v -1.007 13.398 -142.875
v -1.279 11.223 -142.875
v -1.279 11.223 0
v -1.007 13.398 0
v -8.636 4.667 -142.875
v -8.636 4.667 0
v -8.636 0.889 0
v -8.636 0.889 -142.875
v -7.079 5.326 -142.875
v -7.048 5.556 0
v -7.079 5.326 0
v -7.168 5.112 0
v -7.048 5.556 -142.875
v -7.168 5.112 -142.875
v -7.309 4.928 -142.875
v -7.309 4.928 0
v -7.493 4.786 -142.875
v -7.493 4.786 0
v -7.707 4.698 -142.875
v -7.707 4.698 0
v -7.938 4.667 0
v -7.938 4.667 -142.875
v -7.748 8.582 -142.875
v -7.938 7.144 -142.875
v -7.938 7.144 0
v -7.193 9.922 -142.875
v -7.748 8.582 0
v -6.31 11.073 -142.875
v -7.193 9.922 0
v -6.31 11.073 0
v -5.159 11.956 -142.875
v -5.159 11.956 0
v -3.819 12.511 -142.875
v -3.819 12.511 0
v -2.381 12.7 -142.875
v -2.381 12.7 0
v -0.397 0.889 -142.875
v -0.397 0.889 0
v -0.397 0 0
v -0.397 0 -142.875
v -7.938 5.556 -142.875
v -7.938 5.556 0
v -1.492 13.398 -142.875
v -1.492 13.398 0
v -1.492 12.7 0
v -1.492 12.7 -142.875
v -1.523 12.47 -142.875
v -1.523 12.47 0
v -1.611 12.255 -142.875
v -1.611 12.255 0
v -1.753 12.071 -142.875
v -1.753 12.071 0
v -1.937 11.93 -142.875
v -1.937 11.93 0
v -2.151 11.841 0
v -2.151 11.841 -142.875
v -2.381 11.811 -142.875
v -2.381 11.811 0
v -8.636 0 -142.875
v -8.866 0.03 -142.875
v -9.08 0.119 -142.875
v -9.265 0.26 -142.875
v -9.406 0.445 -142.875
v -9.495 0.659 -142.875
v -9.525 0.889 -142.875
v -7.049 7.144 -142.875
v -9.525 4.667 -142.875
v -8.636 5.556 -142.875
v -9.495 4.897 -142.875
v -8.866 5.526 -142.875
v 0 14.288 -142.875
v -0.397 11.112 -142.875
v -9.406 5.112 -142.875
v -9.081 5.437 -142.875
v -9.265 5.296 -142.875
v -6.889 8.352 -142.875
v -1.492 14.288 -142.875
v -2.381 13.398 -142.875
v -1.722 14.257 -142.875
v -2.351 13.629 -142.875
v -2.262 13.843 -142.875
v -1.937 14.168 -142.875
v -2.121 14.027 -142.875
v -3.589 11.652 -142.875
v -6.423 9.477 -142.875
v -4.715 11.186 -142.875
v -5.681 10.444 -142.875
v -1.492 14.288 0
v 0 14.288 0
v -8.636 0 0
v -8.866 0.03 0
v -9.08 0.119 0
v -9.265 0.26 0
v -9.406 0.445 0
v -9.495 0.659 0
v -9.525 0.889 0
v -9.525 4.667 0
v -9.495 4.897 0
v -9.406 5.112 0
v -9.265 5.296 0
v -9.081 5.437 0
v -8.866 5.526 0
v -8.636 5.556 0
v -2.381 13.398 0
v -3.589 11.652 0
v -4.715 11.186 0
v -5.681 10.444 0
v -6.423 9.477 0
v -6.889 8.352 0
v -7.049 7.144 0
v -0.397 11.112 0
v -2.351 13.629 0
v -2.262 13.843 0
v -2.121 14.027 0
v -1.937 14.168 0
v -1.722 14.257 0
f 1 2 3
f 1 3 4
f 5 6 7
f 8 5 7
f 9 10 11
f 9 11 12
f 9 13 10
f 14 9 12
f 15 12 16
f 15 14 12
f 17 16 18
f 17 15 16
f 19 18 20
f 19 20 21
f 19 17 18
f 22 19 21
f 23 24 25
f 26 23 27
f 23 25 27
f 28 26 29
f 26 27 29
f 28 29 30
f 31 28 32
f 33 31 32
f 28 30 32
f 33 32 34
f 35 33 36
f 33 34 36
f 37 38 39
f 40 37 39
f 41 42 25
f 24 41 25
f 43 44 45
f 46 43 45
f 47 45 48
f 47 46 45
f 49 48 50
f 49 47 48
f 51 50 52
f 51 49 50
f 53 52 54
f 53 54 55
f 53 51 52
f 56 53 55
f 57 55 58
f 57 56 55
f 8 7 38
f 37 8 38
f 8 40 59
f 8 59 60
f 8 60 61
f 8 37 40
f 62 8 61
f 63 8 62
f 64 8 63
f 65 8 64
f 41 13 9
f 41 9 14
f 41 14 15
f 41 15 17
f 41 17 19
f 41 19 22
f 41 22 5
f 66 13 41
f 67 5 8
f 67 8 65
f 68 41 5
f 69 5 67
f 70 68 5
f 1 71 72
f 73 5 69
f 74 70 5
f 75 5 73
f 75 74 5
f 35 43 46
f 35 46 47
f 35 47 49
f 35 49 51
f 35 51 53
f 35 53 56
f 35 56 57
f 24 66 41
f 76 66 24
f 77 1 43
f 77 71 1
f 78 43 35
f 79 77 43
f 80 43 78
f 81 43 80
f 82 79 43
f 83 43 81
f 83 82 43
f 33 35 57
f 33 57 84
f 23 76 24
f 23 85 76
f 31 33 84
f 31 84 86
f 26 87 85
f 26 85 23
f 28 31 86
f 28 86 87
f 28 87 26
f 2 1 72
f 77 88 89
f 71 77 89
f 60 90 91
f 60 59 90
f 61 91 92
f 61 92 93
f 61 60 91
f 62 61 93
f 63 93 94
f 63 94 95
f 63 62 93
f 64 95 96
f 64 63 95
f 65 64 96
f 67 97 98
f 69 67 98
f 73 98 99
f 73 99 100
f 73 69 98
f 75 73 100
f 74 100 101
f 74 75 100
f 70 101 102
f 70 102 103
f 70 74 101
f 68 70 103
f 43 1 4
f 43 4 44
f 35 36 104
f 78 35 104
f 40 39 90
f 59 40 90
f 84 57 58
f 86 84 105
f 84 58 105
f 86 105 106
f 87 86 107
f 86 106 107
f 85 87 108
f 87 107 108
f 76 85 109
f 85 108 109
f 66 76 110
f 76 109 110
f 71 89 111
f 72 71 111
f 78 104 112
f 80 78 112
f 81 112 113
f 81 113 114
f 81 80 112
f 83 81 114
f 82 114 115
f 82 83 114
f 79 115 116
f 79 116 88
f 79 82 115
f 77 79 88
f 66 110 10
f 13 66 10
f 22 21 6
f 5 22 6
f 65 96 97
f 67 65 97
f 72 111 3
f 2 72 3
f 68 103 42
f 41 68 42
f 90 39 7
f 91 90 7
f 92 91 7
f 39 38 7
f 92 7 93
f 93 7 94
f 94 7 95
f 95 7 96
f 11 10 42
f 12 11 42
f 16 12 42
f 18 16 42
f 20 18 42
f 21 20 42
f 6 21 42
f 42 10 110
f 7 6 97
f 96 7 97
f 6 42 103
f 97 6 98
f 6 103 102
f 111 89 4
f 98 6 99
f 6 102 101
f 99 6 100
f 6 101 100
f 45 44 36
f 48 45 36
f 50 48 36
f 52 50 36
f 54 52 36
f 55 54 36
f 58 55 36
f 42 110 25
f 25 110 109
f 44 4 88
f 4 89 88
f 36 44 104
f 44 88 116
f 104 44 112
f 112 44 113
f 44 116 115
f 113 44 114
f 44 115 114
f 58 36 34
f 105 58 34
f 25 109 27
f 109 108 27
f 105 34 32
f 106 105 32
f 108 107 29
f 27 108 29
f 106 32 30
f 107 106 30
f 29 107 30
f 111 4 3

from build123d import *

# Parameters (mm, degrees)
EXTRUDE_THIN1_DEPTH = 142.875
FILLET1_R           = 0.889


with BuildPart() as part:
    # Sketch1 → Extrude-Thin1 (new body)
    with BuildSketch(Plane.XY):
        with BuildLine():
            Line((-0.396875, 0), (-9.525, 0))
            Line((-9.525, 0), (-9.525, 5.55625))
            Line((-9.525, 5.55625), (-7.9375, 5.55625))
            Line((-7.9375, 5.55625), (-7.9375, 7.14375))
            ThreePointArc((-7.9375, 7.14375), (-6.310112053, 11.072612053), (-2.38125, 12.7))
            Line((-2.38125, 12.7), (-2.38125, 14.2875))
            Line((-2.38125, 14.2875), (0, 14.2875))
            Line((0, 14.2875), (-0.396875, 11.1125))
            Line((-0.396875, 11.1125), (-1.279010032, 11.222766879))
            Line((-1.279010032, 11.222766879), (-1.007043392, 13.3985))
            Line((-1.007043392, 13.3985), (-1.49225, 13.3985))
            Line((-1.49225, 13.3985), (-1.49225, 11.725551126))
            ThreePointArc((-1.49225, 11.725551126), (-5.350596503, 10.744611551), (-7.0485, 7.14375))
            Line((-7.0485, 7.14375), (-7.0485, 4.66725))
            Line((-7.0485, 4.66725), (-8.636, 4.66725))
            Line((-8.636, 4.66725), (-8.636, 0.889))
            Line((-8.636, 0.889), (-0.396875, 0.889))
            Line((-0.396875, 0.889), (-0.396875, 0))
        make_face()
    extrude(amount=-EXTRUDE_THIN1_DEPTH)

    # Fillet1
    fillet1_edges = [part.edges().sort_by_distance(p)[0] for p in [
        (-1.49225, 11.725551126, -71.4375),
        (-7.0485, 4.66725, -71.4375),
        (-9.525, 0, -71.4375),
        (-9.525, 5.55625, -71.4375),
        (-2.38125, 14.2875, -71.4375),
    ]]
    fillet(fillet1_edges, radius=FILLET1_R)


solid = part.part
